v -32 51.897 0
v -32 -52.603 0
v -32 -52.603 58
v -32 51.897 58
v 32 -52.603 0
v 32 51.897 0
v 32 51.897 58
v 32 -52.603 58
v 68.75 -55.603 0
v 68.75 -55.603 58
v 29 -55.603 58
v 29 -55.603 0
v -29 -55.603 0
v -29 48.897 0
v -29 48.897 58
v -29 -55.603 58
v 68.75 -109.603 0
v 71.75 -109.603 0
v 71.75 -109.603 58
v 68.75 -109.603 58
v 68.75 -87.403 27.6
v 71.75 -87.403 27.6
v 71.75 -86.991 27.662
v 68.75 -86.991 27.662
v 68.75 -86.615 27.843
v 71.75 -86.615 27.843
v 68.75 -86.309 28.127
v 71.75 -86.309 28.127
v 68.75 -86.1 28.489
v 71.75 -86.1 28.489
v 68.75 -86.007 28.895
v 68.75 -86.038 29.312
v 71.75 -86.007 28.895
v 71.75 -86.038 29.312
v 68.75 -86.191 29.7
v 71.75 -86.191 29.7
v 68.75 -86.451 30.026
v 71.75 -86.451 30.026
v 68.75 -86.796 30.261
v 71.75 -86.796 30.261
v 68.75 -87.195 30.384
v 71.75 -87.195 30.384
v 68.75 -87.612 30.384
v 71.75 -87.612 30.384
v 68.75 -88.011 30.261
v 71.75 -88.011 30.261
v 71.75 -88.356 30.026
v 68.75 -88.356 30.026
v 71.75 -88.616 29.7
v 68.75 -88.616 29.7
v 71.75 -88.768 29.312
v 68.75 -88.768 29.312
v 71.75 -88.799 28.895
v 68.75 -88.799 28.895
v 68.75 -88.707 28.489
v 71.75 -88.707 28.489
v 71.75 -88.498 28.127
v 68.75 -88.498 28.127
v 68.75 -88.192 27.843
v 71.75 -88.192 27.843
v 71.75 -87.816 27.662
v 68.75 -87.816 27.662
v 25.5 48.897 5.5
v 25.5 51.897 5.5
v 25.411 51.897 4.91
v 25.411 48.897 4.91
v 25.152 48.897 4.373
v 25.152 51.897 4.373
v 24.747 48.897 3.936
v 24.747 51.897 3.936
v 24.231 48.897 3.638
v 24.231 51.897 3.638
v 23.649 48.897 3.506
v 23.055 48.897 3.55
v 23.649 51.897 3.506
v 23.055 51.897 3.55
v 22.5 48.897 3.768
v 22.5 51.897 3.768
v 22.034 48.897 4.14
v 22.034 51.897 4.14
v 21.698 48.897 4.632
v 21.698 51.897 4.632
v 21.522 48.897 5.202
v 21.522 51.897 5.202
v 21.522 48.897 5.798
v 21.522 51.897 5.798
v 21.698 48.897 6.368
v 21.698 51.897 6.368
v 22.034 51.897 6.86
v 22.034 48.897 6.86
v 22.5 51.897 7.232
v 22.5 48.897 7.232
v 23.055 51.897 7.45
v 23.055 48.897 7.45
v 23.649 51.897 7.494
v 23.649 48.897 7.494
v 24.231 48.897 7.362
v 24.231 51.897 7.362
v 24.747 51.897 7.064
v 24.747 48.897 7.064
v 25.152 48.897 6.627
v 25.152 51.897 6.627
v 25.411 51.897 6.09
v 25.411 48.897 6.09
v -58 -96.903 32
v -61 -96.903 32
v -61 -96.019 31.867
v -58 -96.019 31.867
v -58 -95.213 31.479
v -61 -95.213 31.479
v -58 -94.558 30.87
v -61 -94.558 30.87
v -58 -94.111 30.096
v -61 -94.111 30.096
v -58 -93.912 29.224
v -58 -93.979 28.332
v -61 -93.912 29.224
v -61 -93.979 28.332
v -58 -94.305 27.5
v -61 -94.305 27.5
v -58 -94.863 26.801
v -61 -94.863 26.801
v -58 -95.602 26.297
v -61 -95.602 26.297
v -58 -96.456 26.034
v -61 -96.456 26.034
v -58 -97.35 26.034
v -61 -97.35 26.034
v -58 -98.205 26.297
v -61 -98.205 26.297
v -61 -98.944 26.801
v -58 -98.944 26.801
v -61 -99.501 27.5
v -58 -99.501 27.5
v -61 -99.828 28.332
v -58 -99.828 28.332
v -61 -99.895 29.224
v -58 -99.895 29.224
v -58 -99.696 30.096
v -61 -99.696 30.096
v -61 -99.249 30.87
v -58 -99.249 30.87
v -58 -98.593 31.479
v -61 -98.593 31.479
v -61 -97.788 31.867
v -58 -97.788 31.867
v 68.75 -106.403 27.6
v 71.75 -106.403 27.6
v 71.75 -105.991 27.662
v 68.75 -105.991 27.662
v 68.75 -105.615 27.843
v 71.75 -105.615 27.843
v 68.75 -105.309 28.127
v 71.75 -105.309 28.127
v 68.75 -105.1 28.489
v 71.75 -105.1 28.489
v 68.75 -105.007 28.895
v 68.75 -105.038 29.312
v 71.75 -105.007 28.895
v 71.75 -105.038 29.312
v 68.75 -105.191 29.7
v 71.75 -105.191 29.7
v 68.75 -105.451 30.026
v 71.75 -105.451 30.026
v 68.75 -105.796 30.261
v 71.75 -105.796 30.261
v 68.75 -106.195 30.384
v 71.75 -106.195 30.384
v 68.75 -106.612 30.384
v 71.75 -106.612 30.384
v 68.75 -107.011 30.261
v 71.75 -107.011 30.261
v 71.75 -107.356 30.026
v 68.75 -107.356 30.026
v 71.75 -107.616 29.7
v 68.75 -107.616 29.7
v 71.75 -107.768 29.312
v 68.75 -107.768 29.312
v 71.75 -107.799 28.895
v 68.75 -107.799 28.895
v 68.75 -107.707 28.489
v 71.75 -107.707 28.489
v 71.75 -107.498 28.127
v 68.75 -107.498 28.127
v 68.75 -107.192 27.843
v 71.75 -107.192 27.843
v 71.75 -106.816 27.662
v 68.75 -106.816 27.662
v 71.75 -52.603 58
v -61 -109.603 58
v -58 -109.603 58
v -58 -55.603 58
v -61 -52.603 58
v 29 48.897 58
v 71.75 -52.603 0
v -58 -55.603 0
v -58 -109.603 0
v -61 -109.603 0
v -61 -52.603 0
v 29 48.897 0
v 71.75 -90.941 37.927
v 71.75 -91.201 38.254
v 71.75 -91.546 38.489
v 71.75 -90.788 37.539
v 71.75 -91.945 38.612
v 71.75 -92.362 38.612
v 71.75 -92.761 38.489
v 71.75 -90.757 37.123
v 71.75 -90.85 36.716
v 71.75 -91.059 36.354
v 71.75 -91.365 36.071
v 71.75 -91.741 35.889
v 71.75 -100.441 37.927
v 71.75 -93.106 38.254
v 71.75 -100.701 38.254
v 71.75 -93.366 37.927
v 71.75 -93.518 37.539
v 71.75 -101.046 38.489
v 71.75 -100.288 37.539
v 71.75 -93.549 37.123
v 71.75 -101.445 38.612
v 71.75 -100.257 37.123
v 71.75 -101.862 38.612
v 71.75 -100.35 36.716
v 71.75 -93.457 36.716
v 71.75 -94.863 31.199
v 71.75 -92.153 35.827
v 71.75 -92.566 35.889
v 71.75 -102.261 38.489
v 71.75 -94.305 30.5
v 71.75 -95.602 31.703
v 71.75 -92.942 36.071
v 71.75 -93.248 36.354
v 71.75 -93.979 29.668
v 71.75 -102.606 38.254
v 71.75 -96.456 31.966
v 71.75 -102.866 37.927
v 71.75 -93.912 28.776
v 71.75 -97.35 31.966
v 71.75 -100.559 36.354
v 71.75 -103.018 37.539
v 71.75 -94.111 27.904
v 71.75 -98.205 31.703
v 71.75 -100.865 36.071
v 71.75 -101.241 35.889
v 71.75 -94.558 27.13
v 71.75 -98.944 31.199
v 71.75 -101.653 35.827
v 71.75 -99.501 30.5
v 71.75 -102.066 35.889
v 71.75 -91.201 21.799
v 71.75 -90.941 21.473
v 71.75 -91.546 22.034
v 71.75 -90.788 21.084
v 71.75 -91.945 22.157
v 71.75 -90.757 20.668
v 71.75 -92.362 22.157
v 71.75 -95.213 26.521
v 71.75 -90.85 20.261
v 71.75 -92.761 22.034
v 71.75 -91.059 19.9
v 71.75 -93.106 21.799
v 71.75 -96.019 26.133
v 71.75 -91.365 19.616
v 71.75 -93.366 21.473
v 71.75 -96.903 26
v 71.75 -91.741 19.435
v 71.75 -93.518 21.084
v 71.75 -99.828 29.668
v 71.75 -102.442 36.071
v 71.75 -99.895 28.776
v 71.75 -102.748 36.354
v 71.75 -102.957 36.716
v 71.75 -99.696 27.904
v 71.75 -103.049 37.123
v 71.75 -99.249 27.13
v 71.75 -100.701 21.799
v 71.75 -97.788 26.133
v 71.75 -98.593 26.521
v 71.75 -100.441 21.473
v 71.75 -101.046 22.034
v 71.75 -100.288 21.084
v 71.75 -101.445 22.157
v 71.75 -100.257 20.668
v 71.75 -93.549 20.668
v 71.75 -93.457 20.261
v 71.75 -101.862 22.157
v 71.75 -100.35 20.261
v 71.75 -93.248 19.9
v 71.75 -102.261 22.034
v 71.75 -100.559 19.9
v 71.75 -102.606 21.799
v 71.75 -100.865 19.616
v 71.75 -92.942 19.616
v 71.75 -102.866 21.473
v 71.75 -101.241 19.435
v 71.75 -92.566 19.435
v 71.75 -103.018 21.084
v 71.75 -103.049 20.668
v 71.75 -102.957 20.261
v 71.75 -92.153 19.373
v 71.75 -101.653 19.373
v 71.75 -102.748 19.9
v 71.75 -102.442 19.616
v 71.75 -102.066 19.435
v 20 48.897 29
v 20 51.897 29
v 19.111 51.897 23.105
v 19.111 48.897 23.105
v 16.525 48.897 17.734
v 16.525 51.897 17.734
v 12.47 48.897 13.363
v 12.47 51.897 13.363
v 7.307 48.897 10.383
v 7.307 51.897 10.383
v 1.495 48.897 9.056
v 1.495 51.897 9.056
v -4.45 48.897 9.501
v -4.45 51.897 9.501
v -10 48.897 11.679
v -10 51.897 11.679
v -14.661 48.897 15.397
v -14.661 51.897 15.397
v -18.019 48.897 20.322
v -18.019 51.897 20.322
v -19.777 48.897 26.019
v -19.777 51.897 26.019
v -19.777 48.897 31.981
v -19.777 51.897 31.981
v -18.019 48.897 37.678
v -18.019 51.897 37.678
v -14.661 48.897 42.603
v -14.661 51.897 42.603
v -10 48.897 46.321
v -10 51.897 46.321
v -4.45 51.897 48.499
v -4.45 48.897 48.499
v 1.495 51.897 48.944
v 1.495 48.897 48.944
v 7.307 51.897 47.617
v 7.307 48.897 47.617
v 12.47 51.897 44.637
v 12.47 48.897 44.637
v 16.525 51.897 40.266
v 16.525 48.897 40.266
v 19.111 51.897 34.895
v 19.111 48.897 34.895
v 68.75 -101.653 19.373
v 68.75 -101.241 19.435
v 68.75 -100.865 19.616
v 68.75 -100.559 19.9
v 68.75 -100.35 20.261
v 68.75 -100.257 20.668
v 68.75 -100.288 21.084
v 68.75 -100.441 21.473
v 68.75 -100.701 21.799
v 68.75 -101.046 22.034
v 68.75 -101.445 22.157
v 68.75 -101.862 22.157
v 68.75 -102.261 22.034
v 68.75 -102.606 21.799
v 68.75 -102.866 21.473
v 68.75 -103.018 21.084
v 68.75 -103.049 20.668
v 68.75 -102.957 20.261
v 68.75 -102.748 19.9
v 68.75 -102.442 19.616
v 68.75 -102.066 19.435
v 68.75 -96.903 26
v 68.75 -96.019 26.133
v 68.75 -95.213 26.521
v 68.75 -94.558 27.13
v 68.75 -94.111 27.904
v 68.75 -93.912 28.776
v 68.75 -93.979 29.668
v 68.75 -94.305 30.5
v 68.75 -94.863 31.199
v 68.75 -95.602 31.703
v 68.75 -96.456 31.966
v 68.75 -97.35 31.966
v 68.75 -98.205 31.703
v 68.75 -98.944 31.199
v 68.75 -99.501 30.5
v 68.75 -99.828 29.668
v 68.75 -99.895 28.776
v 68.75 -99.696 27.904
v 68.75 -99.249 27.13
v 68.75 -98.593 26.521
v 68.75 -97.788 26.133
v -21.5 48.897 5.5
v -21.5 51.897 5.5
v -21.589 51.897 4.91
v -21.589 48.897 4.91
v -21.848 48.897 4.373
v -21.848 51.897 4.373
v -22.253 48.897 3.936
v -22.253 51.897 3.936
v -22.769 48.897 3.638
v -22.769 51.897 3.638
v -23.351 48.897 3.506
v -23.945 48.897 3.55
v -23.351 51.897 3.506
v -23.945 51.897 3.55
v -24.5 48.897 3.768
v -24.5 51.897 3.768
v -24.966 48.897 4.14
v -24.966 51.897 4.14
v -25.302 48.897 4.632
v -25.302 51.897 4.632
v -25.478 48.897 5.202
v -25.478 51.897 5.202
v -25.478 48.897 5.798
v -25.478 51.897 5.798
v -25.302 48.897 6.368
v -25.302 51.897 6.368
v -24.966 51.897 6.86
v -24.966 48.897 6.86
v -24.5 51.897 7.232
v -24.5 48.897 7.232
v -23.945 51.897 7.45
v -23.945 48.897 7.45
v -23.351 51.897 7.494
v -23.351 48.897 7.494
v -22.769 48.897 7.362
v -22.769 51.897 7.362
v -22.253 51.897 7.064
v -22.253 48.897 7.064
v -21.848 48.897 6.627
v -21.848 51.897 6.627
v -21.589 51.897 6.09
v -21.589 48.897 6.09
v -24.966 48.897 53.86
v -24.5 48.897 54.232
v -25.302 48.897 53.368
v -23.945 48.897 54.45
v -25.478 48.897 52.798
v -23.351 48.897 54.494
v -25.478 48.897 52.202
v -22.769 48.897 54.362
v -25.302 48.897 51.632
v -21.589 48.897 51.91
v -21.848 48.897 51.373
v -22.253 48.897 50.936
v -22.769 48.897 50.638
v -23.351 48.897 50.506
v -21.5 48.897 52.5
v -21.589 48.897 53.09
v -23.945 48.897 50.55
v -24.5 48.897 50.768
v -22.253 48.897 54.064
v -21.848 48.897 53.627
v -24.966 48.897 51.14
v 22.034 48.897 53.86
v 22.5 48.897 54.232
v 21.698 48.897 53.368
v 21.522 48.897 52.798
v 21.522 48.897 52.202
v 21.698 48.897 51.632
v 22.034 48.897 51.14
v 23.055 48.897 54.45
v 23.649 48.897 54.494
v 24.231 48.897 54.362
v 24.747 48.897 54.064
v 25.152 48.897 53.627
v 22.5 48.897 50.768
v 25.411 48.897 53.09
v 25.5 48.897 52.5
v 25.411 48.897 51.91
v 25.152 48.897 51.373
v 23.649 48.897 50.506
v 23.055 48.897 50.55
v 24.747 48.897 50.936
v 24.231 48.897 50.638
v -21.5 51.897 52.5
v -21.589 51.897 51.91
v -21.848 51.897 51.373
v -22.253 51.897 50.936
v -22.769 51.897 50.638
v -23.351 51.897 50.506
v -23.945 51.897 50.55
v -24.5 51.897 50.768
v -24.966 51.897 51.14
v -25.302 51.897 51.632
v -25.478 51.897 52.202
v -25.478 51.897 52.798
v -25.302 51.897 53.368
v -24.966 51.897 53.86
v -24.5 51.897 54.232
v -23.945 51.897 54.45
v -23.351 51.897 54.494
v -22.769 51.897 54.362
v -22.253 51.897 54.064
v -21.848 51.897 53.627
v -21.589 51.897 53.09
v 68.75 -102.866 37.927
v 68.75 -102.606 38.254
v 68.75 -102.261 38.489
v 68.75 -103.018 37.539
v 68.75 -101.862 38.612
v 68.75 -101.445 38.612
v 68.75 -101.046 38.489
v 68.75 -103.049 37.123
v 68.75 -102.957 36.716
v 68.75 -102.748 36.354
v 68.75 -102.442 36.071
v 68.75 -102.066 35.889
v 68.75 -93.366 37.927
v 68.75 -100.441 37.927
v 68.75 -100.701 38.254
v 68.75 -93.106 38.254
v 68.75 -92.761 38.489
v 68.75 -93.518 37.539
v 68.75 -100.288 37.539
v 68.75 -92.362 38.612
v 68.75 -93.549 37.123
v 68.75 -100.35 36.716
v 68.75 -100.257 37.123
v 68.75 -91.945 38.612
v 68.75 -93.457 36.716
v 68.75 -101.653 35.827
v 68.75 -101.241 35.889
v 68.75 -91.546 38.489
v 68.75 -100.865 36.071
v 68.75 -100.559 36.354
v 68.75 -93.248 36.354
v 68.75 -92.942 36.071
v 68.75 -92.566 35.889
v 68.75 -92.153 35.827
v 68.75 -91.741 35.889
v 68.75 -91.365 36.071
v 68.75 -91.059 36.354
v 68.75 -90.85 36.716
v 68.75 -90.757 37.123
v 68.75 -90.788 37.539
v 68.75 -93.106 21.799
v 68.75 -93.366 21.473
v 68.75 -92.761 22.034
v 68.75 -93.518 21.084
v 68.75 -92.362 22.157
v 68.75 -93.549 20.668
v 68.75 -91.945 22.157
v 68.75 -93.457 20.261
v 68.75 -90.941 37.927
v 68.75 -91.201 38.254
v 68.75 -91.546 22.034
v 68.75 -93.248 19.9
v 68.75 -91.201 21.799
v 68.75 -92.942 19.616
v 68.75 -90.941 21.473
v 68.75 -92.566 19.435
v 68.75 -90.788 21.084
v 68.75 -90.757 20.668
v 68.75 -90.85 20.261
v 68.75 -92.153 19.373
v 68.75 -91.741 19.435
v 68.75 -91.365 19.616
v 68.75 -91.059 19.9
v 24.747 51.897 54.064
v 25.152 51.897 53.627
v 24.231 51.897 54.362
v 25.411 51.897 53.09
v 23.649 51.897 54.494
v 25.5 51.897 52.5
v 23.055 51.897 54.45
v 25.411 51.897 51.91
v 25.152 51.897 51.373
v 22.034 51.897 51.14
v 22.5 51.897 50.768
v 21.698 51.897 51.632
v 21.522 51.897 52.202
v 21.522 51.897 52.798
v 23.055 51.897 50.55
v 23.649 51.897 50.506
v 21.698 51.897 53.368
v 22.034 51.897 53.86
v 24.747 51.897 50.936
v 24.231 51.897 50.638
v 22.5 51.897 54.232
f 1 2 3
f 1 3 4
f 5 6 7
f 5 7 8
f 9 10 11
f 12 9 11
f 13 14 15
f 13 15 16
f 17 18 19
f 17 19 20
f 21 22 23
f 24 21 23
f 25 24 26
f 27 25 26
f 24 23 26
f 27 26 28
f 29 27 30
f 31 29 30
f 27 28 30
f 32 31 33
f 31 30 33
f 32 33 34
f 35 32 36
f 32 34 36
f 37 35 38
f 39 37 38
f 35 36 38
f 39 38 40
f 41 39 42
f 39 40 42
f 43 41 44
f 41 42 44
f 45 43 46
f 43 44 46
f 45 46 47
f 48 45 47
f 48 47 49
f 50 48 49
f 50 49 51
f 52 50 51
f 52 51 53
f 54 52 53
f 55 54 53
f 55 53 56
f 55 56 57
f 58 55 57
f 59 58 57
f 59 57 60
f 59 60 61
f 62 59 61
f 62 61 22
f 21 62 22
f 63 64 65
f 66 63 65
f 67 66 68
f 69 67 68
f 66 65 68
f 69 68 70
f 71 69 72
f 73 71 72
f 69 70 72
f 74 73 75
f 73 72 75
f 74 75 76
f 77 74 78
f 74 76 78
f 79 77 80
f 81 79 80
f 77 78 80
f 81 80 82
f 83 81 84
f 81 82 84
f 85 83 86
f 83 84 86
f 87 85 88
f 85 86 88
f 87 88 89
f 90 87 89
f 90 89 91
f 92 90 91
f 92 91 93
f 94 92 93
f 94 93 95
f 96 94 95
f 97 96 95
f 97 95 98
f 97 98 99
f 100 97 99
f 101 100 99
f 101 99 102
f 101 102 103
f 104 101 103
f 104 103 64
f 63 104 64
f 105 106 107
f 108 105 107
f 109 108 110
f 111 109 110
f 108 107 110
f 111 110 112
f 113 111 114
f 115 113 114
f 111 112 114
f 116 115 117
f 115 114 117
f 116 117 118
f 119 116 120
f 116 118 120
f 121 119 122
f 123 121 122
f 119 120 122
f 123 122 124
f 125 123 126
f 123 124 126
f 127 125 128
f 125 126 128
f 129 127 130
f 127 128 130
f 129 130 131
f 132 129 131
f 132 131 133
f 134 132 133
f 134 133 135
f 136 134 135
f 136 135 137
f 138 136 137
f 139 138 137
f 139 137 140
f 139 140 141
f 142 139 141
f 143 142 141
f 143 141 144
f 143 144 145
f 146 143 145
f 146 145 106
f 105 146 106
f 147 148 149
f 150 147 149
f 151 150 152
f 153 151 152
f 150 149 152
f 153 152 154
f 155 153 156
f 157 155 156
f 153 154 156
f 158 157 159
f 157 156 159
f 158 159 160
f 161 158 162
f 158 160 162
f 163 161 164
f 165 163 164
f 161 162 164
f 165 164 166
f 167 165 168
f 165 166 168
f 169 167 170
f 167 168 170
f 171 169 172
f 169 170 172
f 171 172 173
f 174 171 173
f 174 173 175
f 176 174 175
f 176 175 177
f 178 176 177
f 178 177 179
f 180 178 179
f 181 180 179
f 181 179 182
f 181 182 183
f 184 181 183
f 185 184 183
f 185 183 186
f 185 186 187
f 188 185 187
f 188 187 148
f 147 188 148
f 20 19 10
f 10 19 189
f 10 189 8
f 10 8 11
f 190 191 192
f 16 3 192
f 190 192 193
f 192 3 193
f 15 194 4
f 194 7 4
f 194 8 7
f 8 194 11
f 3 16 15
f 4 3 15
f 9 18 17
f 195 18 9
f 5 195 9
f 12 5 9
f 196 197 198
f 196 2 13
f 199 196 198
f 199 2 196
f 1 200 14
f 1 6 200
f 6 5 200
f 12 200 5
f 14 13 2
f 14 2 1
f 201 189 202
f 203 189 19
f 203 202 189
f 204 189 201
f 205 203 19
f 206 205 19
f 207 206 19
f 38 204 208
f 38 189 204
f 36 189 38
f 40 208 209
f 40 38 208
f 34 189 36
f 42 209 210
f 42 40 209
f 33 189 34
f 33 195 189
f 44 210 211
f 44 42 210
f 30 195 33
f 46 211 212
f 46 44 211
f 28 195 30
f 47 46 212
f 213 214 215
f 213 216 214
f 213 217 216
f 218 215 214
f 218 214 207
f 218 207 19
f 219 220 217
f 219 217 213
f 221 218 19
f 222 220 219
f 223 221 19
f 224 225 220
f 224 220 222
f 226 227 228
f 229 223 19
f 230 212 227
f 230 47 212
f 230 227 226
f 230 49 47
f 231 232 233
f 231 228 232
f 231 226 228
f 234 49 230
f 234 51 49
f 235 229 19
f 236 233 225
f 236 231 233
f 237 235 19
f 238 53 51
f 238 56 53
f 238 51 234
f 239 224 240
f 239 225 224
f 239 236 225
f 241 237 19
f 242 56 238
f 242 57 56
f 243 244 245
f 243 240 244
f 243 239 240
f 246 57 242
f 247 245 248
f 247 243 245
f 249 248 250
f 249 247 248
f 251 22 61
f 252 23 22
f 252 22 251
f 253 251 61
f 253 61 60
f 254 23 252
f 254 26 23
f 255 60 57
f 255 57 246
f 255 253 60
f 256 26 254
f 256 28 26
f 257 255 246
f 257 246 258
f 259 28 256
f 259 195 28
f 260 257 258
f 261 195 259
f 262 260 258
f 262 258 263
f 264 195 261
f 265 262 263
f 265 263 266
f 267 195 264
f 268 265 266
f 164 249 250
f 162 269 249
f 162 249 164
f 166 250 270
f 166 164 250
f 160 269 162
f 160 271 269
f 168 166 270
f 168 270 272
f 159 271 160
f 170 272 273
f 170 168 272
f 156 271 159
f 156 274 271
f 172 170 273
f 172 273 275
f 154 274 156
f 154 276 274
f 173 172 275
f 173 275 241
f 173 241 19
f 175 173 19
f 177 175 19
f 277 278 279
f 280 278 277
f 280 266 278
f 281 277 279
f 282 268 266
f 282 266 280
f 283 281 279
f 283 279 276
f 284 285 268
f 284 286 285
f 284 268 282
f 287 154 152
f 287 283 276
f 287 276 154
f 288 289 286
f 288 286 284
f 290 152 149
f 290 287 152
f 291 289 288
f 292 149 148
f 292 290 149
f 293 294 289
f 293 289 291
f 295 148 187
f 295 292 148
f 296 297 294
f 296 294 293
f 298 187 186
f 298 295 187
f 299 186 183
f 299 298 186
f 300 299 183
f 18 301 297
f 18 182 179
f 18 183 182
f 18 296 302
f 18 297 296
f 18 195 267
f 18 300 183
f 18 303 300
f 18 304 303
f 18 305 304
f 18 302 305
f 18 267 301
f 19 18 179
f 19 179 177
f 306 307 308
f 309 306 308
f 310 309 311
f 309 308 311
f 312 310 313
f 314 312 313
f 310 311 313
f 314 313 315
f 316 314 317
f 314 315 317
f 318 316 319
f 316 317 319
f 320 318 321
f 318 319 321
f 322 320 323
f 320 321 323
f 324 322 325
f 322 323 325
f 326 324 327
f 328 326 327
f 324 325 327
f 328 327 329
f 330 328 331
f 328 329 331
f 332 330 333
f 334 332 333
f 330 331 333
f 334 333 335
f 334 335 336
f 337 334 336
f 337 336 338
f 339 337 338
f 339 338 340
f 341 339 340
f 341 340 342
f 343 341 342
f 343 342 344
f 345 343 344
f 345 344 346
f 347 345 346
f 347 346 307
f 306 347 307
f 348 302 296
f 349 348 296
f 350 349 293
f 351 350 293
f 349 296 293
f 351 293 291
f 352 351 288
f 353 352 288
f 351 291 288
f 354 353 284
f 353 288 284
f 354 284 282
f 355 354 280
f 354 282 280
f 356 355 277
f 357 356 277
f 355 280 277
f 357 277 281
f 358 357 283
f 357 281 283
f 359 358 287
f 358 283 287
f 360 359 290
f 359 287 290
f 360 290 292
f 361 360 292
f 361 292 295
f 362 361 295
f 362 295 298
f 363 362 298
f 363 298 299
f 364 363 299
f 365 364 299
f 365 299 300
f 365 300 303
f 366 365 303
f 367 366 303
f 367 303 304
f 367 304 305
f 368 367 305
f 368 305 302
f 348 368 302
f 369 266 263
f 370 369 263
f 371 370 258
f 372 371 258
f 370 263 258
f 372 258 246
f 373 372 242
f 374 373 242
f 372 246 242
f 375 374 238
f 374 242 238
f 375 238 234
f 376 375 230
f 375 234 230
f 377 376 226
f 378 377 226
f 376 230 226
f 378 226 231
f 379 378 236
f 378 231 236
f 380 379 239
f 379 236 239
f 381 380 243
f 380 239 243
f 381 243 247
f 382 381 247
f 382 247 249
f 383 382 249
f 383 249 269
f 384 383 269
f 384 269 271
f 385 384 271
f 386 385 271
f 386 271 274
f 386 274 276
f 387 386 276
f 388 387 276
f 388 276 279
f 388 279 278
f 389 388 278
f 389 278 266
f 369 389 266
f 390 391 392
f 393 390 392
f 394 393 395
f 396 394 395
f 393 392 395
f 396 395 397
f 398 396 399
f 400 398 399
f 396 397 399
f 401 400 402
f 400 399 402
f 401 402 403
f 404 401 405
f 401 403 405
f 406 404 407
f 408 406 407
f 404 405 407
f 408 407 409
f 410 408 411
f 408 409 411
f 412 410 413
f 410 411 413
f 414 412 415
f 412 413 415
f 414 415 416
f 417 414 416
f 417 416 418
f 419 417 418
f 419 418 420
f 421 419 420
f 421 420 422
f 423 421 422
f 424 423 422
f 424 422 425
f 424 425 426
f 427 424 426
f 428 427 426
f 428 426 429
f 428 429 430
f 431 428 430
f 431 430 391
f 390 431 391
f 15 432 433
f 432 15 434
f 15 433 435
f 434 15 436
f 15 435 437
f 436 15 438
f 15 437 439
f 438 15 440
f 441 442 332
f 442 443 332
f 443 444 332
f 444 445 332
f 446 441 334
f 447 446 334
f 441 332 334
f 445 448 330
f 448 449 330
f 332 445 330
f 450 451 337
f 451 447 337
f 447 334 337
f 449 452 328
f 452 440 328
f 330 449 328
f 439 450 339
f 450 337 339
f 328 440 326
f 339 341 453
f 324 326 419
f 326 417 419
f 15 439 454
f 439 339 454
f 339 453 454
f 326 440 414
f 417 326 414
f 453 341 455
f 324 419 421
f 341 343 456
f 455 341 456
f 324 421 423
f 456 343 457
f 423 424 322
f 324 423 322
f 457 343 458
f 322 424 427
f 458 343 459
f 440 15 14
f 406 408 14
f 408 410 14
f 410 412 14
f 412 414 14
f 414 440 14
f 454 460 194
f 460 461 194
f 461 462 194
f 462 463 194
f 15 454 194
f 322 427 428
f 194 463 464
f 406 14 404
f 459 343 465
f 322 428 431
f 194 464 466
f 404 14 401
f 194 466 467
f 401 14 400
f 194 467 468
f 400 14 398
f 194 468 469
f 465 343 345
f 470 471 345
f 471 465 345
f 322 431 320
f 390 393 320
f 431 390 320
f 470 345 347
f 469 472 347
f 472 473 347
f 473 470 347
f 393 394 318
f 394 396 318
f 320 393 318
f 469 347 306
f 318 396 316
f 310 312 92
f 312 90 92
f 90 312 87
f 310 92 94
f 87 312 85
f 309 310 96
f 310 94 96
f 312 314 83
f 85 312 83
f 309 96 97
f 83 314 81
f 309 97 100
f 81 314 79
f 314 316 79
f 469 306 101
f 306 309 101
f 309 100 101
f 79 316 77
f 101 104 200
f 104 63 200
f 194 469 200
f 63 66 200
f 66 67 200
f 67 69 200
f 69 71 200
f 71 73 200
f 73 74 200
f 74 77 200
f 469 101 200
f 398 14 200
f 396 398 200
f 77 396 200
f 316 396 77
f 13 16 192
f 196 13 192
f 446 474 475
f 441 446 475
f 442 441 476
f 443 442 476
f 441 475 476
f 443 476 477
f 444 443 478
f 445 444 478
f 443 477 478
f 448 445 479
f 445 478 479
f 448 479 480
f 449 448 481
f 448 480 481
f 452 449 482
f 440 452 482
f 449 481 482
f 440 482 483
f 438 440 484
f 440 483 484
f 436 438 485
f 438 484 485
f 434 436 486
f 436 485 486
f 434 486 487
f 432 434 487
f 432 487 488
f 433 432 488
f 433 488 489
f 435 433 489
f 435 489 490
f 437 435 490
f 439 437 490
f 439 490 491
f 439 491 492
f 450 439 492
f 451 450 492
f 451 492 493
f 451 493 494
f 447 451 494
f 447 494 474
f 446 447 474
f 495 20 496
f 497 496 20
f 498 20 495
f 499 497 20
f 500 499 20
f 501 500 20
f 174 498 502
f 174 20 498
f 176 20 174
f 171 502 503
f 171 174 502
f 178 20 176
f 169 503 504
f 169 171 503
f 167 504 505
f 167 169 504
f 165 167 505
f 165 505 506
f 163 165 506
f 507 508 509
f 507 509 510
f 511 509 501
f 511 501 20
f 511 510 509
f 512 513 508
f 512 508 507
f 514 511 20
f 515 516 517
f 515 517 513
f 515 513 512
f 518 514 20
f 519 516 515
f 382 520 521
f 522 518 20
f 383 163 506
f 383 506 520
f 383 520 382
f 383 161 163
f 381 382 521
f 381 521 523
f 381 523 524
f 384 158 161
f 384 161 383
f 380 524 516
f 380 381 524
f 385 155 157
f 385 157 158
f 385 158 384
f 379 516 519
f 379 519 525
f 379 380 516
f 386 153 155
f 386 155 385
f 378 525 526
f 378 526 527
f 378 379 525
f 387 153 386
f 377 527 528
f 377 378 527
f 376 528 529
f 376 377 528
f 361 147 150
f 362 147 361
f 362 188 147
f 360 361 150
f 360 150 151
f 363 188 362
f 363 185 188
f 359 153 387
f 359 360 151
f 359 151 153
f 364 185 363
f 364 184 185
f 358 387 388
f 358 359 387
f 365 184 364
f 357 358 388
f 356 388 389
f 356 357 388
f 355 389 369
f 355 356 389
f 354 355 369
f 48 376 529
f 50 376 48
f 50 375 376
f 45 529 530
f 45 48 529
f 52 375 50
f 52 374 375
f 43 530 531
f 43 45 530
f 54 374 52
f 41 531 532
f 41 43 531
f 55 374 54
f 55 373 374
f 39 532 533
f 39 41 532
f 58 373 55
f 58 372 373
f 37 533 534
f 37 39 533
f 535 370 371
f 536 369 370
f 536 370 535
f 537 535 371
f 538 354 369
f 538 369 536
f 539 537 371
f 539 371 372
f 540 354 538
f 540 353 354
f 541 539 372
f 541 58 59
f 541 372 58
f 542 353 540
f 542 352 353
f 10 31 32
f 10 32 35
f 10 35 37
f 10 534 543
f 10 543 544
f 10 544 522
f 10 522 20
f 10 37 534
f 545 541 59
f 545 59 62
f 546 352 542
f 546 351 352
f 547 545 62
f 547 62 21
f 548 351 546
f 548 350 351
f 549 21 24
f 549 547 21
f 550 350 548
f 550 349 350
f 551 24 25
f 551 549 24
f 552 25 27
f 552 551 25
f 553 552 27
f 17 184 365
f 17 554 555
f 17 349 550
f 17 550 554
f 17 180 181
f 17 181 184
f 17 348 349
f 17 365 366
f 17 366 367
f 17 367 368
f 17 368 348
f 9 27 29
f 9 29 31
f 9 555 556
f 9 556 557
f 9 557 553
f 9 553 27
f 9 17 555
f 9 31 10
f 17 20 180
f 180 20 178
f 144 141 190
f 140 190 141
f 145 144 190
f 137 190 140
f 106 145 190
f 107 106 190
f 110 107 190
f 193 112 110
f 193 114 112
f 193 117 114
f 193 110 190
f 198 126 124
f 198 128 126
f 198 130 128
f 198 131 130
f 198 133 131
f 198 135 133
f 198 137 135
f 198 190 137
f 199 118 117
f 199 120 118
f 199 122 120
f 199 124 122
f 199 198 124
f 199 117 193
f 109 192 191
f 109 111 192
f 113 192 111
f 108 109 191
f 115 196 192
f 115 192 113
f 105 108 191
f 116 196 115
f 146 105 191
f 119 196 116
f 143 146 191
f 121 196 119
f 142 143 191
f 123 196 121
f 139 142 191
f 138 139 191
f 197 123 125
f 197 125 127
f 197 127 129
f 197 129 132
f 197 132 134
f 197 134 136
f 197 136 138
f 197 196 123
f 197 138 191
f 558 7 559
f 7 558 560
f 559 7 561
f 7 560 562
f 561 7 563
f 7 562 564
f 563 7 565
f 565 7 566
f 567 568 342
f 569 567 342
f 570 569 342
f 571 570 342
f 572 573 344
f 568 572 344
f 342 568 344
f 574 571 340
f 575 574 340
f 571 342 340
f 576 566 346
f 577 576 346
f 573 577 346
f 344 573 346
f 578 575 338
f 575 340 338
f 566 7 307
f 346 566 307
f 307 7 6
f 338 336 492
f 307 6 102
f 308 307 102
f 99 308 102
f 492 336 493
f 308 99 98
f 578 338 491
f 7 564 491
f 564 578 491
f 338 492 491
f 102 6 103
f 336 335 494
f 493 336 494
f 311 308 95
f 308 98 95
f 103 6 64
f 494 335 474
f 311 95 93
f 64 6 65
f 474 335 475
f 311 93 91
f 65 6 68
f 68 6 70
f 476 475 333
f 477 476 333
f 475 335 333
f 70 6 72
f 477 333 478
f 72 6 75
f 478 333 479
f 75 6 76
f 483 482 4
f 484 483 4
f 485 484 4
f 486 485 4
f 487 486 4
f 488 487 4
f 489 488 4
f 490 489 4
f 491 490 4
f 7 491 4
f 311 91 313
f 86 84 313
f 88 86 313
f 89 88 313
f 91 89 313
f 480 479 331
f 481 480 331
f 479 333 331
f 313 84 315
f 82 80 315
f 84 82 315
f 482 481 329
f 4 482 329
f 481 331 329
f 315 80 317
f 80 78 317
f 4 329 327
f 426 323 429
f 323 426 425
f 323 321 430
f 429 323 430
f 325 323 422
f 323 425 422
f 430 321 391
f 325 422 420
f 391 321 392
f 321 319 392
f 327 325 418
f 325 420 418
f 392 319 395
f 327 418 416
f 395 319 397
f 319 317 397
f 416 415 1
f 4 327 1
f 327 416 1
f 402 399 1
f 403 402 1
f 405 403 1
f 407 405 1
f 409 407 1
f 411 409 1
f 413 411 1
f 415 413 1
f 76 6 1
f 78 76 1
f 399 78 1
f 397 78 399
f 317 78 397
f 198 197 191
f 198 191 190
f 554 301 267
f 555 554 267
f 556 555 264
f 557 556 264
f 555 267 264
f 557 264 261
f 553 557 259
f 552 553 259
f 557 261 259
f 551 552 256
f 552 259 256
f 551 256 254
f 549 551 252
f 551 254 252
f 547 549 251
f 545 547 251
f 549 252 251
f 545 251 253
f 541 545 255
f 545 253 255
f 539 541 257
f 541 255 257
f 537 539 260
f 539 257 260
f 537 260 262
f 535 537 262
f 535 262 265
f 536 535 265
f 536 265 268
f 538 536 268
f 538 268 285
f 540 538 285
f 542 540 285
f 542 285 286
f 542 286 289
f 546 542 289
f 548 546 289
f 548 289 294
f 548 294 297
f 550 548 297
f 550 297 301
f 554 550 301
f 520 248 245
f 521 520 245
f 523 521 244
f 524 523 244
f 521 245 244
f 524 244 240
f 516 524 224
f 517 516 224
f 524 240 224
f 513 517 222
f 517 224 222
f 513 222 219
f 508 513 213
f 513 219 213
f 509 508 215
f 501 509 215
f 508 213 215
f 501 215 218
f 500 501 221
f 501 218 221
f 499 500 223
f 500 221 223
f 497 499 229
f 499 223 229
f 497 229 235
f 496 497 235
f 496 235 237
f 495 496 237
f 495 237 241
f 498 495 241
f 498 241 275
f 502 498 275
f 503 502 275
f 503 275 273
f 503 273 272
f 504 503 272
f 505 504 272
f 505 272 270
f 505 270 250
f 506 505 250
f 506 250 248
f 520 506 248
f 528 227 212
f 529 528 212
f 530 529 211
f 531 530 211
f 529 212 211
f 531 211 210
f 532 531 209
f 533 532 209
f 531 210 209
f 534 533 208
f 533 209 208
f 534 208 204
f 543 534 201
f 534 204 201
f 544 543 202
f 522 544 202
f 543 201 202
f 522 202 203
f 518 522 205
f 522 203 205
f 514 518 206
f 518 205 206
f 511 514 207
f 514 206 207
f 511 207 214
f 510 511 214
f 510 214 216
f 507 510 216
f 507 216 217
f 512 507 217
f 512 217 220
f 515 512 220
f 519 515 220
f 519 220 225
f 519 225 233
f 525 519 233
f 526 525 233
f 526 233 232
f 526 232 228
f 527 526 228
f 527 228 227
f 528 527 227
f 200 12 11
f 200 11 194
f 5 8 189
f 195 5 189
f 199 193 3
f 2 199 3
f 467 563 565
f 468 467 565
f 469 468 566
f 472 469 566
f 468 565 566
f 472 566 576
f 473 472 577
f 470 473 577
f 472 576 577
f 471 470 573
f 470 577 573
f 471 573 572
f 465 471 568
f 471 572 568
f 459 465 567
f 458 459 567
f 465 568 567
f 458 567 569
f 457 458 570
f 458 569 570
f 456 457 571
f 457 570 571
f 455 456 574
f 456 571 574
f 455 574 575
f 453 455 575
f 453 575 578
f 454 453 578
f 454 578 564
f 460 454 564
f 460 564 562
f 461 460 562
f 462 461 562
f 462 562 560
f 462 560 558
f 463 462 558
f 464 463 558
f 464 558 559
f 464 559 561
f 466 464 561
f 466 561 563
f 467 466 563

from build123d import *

# Parameters (mm, degrees)
BOSS_EXTRUDE1_DEPTH = 58
SKETCH3_R           = 2
SKETCH3_R_2         = 20
CUT_EXTRUDE1_DEPTH  = 58
SKETCH4_R           = 3
SKETCH4_R_2         = 1.4
CUT_EXTRUDE2_DEPTH  = 58
SKETCH5_R           = 3
CUT_EXTRUDE3_DEPTH  = 58


with BuildPart() as part:
    # Sketch2 → Boss-Extrude1 (new body)
    with BuildSketch(Plane.XY):
        Polygon((0, 51.896715462), (32, 51.896715462), (32, -52.603284538), (71.75, -52.603284538), (71.75, -109.603284538), (68.75, -109.603284538), (68.75, -55.603284538), (29, -55.603284538), (29, 48.896715462), (0, 48.896715462), (-29, 48.896715462), (-29, -55.603284538), (-58, -55.603284538), (-58, -109.603284538), (-61, -109.603284538), (-61, -52.603284538), (-32, -52.603284538), (-32, 51.896715462), align=None)
    extrude(amount=BOSS_EXTRUDE1_DEPTH)

    # Sketch3 → Cut-Extrude1 (cut)
    with BuildSketch(Plane(origin=(0, 51.896715462, 0), x_dir=(1, 0, 0), z_dir=(0, 1, 0))):
        with Locations((-23.5, -5.5)):
            Circle(SKETCH3_R)
        with Locations((23.5, -5.5)):
            Circle(SKETCH3_R)
        with Locations((23.5, -52.5)):
            Circle(SKETCH3_R)
        with Locations((-23.5, -52.5)):
            Circle(SKETCH3_R)
        with Locations((0, -29)):
            Circle(SKETCH3_R_2)
    extrude(amount=-CUT_EXTRUDE1_DEPTH, mode=Mode.SUBTRACT)

    # Sketch4 → Cut-Extrude2 (cut)
    with BuildSketch(Plane(origin=(71.75, 0, 0), x_dir=(0, 0, -1), z_dir=(1, 0, 0))):
        with Locations((-29, -96.903284538)):
            Circle(SKETCH4_R)
        with Locations((-29, -87.403284538)):
            Circle(SKETCH4_R_2)
        with Locations((-20.772758664, -92.153284538)):
            Circle(SKETCH4_R_2)
        with Locations((-20.772758664, -101.653284538)):
            Circle(SKETCH4_R_2)
        with Locations((-29, -106.403284538)):
            Circle(SKETCH4_R_2)
        with Locations((-37.227241336, -101.653284538)):
            Circle(SKETCH4_R_2)
        with Locations((-37.227241336, -92.153284538)):
            Circle(SKETCH4_R_2)
    extrude(amount=-CUT_EXTRUDE2_DEPTH, mode=Mode.SUBTRACT)

    # Sketch5 → Cut-Extrude3 (cut)
    with BuildSketch(Plane.ZY.offset(61)):
        with Locations((29, -96.903284538)):
            Circle(SKETCH5_R)
    extrude(amount=-CUT_EXTRUDE3_DEPTH, mode=Mode.SUBTRACT)


solid = part.part
